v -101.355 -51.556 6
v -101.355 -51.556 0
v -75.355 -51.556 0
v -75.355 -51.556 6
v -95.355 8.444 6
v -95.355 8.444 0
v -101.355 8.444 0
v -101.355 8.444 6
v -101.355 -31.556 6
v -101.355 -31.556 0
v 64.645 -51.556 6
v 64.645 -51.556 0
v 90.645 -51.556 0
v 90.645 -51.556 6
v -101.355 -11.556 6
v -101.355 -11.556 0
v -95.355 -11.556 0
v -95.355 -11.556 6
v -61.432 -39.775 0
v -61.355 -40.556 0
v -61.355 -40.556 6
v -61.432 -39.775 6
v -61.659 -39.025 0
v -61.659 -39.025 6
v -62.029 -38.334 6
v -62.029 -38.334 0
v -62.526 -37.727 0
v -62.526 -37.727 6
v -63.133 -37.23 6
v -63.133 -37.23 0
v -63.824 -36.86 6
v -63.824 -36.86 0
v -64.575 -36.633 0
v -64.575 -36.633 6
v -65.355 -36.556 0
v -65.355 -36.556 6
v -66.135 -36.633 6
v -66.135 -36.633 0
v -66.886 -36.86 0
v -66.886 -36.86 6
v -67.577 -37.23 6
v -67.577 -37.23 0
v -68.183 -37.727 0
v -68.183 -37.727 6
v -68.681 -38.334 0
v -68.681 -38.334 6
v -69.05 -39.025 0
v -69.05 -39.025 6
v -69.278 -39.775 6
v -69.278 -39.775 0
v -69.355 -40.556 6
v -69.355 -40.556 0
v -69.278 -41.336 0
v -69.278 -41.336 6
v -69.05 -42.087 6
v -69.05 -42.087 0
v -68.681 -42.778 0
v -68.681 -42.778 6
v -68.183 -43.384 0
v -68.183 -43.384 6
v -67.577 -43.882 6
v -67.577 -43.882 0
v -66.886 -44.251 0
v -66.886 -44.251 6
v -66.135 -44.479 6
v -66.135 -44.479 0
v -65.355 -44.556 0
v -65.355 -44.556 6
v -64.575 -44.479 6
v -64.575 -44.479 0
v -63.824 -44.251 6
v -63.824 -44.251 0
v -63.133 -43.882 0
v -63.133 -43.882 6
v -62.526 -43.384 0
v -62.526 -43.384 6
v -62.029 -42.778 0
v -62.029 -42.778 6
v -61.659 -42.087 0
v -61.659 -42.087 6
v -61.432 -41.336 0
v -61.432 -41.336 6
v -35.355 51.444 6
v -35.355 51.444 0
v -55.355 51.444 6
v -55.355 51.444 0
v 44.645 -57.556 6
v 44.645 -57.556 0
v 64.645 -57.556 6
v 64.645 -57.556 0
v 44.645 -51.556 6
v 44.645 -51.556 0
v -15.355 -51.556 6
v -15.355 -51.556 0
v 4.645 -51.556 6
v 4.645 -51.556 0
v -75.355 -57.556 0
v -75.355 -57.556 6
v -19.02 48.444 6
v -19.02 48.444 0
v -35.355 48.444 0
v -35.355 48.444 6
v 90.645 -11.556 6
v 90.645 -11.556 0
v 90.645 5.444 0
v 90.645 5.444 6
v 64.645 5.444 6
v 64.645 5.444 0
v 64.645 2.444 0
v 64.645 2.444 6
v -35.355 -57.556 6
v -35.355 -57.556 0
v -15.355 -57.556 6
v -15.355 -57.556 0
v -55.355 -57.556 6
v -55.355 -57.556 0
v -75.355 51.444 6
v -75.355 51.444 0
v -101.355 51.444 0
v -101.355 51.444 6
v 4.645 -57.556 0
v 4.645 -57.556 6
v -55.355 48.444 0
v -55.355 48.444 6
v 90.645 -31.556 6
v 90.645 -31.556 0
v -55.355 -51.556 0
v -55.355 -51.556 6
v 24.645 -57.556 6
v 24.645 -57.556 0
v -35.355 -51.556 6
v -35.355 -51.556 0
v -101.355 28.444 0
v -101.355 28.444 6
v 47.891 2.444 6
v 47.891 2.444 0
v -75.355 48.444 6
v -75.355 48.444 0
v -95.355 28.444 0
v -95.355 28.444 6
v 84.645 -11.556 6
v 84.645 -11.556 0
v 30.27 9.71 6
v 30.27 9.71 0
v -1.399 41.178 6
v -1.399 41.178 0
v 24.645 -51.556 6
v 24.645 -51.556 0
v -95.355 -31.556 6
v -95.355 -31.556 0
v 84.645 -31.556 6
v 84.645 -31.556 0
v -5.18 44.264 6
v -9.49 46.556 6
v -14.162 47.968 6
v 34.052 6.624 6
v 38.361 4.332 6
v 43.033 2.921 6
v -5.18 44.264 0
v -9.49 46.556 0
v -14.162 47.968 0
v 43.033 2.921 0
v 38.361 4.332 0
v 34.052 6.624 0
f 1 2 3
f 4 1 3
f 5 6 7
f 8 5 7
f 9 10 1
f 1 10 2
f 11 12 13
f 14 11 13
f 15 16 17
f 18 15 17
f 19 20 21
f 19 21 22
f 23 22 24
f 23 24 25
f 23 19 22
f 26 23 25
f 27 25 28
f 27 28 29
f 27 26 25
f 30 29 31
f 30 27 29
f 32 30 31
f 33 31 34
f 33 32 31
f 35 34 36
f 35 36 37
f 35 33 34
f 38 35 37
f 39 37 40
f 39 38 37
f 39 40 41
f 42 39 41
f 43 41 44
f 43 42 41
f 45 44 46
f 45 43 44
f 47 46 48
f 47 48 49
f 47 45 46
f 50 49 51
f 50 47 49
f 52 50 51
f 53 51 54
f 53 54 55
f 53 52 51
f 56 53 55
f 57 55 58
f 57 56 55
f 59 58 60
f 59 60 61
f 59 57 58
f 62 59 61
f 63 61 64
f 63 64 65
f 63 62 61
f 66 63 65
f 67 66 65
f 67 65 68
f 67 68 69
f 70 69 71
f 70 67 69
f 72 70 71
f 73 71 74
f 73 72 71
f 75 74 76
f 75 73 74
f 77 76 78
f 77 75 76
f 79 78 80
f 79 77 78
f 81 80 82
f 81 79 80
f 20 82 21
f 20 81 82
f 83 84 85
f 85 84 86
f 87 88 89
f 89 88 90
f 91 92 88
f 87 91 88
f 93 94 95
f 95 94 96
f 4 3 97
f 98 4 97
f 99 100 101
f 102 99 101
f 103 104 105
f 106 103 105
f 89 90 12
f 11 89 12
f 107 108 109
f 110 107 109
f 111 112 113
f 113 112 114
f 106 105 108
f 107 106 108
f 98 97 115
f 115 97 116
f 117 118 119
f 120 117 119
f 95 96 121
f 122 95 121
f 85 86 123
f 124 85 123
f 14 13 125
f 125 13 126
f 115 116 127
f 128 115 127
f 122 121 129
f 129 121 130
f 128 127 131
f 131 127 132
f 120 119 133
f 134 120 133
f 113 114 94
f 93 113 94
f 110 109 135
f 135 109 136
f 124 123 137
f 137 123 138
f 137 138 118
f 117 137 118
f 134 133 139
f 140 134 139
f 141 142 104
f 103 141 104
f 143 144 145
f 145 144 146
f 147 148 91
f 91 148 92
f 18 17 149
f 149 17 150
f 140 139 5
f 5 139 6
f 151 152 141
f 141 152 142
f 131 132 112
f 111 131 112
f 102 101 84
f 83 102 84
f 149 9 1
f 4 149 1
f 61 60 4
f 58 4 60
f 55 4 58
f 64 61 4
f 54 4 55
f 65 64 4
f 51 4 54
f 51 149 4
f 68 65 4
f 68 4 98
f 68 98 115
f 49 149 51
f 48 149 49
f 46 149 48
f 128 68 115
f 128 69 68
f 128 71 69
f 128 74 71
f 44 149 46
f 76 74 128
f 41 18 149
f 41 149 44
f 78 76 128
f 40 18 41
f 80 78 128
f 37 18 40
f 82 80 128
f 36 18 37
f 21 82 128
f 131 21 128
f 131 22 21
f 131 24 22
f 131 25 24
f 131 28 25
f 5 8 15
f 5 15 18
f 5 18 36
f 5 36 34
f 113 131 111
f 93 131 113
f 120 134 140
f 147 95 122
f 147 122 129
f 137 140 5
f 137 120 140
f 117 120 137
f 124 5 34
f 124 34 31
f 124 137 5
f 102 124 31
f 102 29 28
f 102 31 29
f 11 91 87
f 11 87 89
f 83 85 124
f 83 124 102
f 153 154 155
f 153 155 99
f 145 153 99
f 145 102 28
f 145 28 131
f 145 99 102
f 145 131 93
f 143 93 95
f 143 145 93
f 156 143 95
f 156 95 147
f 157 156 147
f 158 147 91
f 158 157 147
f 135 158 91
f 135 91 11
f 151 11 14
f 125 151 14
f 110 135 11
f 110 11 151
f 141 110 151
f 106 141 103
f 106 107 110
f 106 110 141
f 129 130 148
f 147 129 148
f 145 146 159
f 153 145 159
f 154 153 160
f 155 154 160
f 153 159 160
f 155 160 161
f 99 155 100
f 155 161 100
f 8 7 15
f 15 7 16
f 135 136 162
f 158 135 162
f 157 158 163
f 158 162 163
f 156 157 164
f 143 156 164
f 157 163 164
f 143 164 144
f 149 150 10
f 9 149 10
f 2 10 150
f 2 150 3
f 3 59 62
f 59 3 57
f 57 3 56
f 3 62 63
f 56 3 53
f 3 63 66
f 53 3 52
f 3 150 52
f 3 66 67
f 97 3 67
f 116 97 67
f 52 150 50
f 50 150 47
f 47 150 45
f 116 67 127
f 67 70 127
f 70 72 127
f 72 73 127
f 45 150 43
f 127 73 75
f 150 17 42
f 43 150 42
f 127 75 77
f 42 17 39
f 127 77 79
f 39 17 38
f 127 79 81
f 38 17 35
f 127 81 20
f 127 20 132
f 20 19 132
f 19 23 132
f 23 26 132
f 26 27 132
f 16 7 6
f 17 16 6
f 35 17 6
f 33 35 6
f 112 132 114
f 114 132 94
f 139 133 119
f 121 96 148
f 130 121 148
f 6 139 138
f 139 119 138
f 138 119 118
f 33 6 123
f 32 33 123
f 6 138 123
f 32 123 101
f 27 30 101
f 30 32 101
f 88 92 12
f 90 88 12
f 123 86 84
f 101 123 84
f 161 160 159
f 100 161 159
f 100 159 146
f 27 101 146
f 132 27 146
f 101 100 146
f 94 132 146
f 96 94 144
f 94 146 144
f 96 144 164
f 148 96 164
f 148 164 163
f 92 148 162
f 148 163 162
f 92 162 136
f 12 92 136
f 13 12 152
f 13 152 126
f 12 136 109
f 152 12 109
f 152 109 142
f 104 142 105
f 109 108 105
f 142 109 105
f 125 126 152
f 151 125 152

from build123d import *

# Parameters (mm, degrees)
SKETCH1_R           = 4
BOSS_EXTRUDE1_DEPTH = 6


with BuildPart() as part:
    # Sketch1 → Boss-Extrude1 (new body)
    with BuildSketch(Plane.XY):
        with BuildLine():
            Line((-95.354884471, 28.444147702), (-95.354884471, 8.444147702))
            Line((-95.354884471, 8.444147702), (-101.354884471, 8.444147702))
            Line((-101.354884471, 8.444147702), (-101.354884471, -11.555852298))
            Line((-101.354884471, -11.555852298), (-95.354884471, -11.555852298))
            Line((-95.354884471, -11.555852298), (-95.354884471, -31.555852298))
            Line((-95.354884471, -31.555852298), (-101.354884471, -31.555852298))
            Line((-101.354884471, -31.555852298), (-101.354884471, -51.555852298))
            Line((-101.354884471, -51.555852298), (-75.354884471, -51.555852298))
            Line((-75.354884471, -51.555852298), (-75.354884471, -57.555852298))
            Line((-75.354884471, -57.555852298), (-55.354884471, -57.555852298))
            Line((-55.354884471, -57.555852298), (-55.354884471, -51.555852298))
            Line((-55.354884471, -51.555852298), (-35.354884471, -51.555852298))
            Line((-35.354884471, -51.555852298), (-35.354884471, -57.555852298))
            Line((-35.354884471, -57.555852298), (-15.354884471, -57.555852298))
            Line((-15.354884471, -57.555852298), (-15.354884471, -51.555852298))
            Line((-15.354884471, -51.555852298), (4.645115529, -51.555852298))
            Line((4.645115529, -51.555852298), (4.645115529, -57.555852298))
            Line((4.645115529, -57.555852298), (24.645115529, -57.555852298))
            Line((24.645115529, -57.555852298), (24.645115529, -51.555852298))
            Line((24.645115529, -51.555852298), (44.645115529, -51.555852298))
            Line((44.645115529, -51.555852298), (44.645115529, -57.555852298))
            Line((44.645115529, -57.555852298), (64.645115529, -57.555852298))
            Line((64.645115529, -57.555852298), (64.645115529, -51.555852298))
            Line((64.645115529, -51.555852298), (90.645115529, -51.555852298))
            Line((90.645115529, -51.555852298), (90.645115529, -31.555852298))
            Line((90.645115529, -31.555852298), (84.645115529, -31.555852298))
            Line((84.645115529, -31.555852298), (84.645115529, -11.555852298))
            Line((84.645115529, -11.555852298), (90.645115529, -11.555852298))
            Line((90.645115529, -11.555852298), (90.645115529, 5.444147702))
            Line((90.645115529, 5.444147702), (64.645115529, 5.444147702))
            Line((64.645115529, 5.444147702), (64.645115529, 2.444147702))
            Line((64.645115529, 2.444147702), (47.89113696, 2.444147702))
            ThreePointArc((47.89113696, 2.444147702), (38.36080563, 4.331969424), (30.269799621, 9.710324922))
            Line((30.269799621, 9.710324922), (-1.398719, 41.177970481))
            ThreePointArc((-1.398719, 41.177970481), (-9.48972501, 46.55632598), (-19.020056339, 48.444147702))
            Line((-19.020056339, 48.444147702), (-35.354884471, 48.444147702))
            Line((-35.354884471, 48.444147702), (-35.354884471, 51.444147702))
            Line((-35.354884471, 51.444147702), (-55.354884471, 51.444147702))
            Line((-55.354884471, 51.444147702), (-55.354884471, 48.444147702))
            Line((-55.354884471, 48.444147702), (-75.354884471, 48.444147702))
            Line((-75.354884471, 48.444147702), (-75.354884471, 51.444147702))
            Line((-75.354884471, 51.444147702), (-101.354884471, 51.444147702))
            Line((-101.354884471, 51.444147702), (-101.354884471, 28.444147702))
            Line((-101.354884471, 28.444147702), (-95.354884471, 28.444147702))
        make_face()
        with Locations((-65.354884471, -40.555852298)):
            Circle(SKETCH1_R, mode=Mode.SUBTRACT)
    extrude(amount=BOSS_EXTRUDE1_DEPTH)


solid = part.part
